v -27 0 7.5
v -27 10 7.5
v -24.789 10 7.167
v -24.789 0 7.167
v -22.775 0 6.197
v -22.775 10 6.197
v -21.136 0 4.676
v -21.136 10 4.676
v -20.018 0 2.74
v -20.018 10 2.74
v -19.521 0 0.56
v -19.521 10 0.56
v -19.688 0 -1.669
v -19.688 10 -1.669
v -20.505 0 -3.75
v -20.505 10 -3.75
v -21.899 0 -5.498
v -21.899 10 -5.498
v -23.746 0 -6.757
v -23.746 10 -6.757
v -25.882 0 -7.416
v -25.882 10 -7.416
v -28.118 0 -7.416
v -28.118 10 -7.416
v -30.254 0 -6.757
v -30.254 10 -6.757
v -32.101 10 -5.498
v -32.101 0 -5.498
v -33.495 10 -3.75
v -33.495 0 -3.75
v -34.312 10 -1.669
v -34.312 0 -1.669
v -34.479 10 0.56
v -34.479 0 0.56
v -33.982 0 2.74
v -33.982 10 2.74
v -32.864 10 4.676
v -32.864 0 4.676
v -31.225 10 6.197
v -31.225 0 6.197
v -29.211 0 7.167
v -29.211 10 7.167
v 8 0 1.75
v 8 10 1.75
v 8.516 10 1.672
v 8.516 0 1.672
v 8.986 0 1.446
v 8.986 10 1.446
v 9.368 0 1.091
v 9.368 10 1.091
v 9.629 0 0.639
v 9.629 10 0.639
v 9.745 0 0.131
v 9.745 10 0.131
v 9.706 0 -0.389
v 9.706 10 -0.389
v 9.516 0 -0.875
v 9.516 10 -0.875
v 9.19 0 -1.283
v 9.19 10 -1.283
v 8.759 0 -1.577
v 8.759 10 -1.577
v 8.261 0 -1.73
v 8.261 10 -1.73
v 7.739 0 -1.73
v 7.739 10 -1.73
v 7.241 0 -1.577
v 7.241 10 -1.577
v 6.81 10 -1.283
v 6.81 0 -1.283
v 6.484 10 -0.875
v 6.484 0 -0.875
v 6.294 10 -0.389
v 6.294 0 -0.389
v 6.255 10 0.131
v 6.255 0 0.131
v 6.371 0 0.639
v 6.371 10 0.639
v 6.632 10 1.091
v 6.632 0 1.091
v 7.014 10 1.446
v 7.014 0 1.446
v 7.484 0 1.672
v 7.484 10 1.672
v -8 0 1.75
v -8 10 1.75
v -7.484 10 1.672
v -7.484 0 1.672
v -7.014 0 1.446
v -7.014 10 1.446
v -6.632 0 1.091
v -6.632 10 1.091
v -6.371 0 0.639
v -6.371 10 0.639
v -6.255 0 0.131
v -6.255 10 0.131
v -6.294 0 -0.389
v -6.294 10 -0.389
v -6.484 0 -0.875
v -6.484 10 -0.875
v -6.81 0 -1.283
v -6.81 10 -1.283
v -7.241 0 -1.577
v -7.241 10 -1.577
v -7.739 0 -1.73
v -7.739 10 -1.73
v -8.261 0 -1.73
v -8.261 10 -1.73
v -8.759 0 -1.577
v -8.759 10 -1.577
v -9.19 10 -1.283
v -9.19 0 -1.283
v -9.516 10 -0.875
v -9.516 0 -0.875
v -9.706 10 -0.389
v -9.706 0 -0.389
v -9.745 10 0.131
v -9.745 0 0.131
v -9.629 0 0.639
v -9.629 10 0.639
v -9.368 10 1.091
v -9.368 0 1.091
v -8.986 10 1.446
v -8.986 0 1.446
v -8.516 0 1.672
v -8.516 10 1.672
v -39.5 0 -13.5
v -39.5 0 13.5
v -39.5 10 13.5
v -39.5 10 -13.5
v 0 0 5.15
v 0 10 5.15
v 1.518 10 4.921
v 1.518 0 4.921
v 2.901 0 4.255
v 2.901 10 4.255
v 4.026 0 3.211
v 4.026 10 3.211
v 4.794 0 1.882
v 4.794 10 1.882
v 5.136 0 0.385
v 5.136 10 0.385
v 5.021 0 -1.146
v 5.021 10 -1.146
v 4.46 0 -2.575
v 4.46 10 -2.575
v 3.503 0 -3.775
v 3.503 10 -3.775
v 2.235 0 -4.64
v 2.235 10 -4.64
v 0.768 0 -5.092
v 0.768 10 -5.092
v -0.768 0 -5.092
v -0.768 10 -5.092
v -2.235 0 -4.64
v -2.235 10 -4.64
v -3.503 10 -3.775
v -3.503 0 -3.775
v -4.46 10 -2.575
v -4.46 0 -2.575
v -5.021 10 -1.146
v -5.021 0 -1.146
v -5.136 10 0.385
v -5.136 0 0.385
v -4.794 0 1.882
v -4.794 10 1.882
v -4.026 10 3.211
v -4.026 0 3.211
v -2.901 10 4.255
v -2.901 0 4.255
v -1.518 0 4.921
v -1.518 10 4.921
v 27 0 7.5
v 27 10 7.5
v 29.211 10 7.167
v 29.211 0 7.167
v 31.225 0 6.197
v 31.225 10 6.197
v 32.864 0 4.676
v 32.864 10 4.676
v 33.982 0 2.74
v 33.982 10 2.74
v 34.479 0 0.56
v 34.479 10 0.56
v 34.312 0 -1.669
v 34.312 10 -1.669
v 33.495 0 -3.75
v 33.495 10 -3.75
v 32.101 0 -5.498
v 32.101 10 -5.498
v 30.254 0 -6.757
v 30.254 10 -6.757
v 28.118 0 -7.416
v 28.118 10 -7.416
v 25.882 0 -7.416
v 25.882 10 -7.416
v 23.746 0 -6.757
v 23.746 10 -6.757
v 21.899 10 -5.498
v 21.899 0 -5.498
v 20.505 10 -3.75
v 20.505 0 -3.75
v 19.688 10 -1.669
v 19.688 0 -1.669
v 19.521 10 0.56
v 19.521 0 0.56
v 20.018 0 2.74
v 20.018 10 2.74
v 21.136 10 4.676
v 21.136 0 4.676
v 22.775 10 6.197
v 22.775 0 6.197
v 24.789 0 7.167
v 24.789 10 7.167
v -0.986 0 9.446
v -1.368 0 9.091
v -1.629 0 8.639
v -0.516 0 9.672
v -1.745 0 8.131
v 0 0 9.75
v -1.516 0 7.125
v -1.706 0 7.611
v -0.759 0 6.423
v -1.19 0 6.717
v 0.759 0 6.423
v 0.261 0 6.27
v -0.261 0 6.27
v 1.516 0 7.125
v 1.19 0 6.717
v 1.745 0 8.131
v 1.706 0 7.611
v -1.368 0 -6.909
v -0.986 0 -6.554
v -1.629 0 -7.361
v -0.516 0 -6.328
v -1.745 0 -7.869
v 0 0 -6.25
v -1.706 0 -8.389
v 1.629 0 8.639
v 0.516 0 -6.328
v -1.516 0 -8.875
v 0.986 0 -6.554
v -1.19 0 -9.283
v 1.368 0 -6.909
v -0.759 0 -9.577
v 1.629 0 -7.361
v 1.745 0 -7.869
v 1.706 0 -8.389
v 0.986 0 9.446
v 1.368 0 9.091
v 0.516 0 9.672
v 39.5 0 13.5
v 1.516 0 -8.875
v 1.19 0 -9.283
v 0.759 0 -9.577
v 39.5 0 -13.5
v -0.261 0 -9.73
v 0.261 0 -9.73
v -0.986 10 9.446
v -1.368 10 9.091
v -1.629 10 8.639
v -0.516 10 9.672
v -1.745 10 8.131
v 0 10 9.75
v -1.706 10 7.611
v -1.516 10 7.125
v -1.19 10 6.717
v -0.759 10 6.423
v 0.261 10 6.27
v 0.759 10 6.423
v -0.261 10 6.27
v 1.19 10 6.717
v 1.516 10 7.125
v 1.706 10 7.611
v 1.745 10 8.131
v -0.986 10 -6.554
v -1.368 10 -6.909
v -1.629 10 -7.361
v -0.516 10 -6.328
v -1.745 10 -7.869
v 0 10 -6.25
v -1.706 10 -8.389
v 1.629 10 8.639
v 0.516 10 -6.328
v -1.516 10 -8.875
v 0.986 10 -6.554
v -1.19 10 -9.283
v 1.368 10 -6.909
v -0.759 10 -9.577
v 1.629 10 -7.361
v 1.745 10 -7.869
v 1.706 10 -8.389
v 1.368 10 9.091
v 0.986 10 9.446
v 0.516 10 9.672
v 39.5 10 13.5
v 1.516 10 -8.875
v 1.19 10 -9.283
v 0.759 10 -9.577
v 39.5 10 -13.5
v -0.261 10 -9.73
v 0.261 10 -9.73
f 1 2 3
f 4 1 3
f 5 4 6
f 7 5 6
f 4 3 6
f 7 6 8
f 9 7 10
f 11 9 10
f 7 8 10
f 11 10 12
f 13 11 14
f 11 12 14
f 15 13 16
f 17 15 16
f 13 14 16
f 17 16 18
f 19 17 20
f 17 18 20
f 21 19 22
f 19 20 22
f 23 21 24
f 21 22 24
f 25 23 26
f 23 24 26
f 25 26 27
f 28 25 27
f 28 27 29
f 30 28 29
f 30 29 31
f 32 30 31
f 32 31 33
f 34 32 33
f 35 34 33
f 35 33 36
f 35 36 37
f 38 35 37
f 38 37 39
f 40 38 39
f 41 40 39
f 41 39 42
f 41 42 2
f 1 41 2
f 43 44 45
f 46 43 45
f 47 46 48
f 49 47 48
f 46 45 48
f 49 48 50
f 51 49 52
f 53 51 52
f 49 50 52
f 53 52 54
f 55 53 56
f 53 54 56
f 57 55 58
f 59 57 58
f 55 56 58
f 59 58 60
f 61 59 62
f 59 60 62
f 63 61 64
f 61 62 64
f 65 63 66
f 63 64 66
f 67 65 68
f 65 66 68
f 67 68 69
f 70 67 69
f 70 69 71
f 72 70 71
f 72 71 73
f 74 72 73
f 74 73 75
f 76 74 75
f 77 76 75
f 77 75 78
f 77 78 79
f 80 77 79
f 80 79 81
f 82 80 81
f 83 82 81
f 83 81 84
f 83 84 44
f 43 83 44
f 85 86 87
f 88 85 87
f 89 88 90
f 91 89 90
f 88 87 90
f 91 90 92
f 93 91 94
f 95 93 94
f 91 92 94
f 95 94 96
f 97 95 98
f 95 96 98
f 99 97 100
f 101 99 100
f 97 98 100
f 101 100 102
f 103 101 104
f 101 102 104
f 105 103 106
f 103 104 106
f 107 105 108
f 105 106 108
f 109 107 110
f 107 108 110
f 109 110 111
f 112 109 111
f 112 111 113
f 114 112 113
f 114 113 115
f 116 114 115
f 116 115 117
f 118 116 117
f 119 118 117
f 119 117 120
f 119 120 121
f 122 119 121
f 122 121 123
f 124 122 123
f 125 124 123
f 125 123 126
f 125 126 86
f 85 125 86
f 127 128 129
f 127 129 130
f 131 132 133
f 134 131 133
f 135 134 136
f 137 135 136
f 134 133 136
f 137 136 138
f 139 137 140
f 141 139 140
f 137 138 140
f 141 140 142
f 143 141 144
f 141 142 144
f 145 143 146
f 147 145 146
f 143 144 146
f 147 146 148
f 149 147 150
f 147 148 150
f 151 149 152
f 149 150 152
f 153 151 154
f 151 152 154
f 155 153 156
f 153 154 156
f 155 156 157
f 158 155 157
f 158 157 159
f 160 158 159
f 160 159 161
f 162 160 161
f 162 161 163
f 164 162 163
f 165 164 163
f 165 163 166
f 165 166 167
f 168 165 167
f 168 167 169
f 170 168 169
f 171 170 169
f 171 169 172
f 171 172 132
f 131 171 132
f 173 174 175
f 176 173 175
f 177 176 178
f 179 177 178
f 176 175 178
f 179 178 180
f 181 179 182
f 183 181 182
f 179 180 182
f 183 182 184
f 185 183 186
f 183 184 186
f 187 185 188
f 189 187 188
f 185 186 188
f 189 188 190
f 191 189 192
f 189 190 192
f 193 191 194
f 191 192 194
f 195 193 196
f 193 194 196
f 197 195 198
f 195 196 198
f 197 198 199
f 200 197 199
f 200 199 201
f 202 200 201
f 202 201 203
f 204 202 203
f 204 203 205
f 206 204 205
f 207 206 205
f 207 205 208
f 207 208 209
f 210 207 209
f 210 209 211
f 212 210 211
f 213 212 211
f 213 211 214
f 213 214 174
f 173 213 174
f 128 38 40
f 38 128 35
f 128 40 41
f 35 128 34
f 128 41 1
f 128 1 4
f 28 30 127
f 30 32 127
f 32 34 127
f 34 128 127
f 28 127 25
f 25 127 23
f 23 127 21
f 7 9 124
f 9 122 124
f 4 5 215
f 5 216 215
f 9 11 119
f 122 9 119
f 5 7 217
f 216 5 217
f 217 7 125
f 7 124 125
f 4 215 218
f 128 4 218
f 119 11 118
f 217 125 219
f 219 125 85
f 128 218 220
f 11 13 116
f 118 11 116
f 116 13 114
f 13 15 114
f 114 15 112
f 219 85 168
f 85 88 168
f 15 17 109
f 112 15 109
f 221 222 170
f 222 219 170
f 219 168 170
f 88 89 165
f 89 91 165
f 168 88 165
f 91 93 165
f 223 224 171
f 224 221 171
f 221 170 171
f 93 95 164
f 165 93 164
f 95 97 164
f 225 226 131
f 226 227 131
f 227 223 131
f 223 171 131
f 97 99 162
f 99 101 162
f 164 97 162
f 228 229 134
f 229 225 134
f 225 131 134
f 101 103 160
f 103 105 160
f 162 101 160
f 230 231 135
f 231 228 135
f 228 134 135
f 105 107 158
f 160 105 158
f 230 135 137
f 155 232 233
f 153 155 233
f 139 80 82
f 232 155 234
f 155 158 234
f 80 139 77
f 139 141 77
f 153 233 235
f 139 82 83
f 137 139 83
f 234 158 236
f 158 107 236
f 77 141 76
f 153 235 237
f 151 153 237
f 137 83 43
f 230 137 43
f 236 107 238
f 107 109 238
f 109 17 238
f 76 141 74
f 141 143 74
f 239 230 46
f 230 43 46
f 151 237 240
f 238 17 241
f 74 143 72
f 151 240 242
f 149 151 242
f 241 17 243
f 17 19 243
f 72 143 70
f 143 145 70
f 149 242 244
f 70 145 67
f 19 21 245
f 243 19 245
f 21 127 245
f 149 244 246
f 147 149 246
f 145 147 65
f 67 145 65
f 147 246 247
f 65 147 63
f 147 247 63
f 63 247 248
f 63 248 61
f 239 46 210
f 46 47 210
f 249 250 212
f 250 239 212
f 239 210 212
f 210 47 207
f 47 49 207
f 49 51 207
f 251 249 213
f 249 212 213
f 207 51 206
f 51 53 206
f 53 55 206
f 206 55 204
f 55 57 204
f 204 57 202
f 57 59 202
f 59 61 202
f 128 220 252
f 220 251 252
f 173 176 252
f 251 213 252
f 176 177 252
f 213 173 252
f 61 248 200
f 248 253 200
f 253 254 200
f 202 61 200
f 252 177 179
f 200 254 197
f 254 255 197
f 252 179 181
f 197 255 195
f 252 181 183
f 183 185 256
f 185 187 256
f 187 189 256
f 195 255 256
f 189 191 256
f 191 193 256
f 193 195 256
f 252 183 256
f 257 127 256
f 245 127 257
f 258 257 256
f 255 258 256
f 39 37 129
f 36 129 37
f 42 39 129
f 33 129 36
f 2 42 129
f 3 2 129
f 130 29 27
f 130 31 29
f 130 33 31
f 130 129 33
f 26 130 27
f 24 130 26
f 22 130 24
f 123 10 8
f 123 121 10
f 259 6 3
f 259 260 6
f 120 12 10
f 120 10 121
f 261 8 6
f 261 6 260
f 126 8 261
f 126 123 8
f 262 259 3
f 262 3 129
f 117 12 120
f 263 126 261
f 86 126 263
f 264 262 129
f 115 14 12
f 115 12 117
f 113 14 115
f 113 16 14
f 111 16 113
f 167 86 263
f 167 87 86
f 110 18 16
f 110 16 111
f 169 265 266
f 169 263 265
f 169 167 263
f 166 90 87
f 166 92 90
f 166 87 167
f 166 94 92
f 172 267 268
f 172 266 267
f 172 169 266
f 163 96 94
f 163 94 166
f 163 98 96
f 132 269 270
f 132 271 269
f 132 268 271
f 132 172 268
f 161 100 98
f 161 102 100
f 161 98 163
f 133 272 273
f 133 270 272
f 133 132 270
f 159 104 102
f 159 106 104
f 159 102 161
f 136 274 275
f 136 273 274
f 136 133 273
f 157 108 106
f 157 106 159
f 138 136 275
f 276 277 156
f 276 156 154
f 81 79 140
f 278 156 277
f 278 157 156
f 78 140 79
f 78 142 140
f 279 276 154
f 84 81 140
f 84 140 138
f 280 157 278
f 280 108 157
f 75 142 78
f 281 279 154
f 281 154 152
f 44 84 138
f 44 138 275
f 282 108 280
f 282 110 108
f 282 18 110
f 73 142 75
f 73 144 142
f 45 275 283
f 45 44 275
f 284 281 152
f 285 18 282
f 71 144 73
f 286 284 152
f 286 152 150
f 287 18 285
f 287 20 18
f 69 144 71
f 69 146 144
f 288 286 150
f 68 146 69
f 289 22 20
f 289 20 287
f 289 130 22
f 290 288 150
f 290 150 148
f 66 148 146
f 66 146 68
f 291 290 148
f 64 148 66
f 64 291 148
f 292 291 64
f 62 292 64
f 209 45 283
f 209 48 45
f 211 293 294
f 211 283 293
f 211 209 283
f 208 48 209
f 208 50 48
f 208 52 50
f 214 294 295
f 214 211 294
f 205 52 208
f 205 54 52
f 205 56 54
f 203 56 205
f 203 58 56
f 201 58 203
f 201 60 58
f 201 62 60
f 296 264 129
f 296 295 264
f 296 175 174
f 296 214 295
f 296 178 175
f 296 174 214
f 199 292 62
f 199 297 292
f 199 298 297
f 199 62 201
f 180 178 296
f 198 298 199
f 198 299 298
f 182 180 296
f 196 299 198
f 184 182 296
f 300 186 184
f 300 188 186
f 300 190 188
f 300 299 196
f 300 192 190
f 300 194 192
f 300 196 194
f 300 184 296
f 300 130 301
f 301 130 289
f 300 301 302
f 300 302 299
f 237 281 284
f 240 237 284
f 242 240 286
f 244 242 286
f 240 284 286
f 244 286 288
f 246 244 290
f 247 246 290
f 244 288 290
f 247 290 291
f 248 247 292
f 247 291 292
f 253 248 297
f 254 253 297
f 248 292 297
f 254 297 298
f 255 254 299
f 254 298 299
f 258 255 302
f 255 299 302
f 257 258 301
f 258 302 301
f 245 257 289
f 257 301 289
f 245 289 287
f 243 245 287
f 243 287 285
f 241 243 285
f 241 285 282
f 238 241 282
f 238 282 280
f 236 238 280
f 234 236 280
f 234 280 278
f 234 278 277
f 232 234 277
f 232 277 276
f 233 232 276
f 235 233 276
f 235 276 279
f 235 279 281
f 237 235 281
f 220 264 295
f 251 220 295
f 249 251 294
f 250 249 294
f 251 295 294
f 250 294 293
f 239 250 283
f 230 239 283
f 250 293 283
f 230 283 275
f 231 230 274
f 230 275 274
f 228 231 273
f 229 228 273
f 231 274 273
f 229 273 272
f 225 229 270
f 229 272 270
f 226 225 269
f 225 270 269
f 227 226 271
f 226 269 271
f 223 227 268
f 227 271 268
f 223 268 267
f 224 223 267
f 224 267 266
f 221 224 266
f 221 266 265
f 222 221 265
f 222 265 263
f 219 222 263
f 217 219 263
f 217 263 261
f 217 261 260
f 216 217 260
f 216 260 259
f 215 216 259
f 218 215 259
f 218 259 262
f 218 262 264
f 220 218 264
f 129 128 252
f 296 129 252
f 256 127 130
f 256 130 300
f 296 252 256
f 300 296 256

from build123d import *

# Parameters (mm, degrees)
SKETCH_1_W          = 79
SKETCH_1_H          = 27
EXTRUDE_1_DEPTH     = 10
SKETCH_3_R          = 7.5
CUT_EXTRUDE_1_DEPTH = 43.924352063
SKETCH_4_R          = 5.15
CUT_EXTRUDE_2_DEPTH = 43.924352063
SKETCH_5_R          = 1.75
CUT_EXTRUDE_3_DEPTH = 43.924352063


with BuildPart() as part:
    # 草图1 → 凸台-拉伸1 (new body)
    with BuildSketch(Plane(origin=(0, 0, 0), x_dir=(1, 0, 0), z_dir=(0, 1, 0))):
        Rectangle(SKETCH_1_W, SKETCH_1_H)
    extrude(amount=EXTRUDE_1_DEPTH)

    # 草图3 → 切除-拉伸1 (cut, through all)
    with BuildSketch(Plane(origin=(0, 10, 0), x_dir=(1, 0, 0), z_dir=(0, 1, 0))):
        with Locations(Location((-27, 0, 0), (0, 0, 270))):
            Circle(SKETCH_3_R)
        with Locations(Location((27, 0, 0), (0, 0, 270))):
            Circle(SKETCH_3_R)
    extrude(amount=-CUT_EXTRUDE_1_DEPTH, mode=Mode.SUBTRACT)

    # 草图4 → 切除-拉伸2 (cut, through all)
    with BuildSketch(Plane(origin=(0, 10, 0), x_dir=(1, 0, 0), z_dir=(0, 1, 0))):
        with Locations(Location((0, 0, 0), (0, 0, 270))):
            Circle(SKETCH_4_R)
    extrude(amount=-CUT_EXTRUDE_2_DEPTH, mode=Mode.SUBTRACT)

    # 草图5 → 切除-拉伸3 (cut, through all)
    with BuildSketch(Plane(origin=(0, 10, 0), x_dir=(1, 0, 0), z_dir=(0, 1, 0))):
        with Locations(Location((8, 0, 0), (0, 0, 270))):
            Circle(SKETCH_5_R)
        with Locations(Location((0, -8, 0), (0, 0, 270))):
            Circle(SKETCH_5_R)
        with Locations(Location((-8, 0, 0), (0, 0, 270))):
            Circle(SKETCH_5_R)
        with Locations(Location((0, 8, 0), (0, 0, 270))):
            Circle(SKETCH_5_R)
    extrude(amount=-CUT_EXTRUDE_3_DEPTH, mode=Mode.SUBTRACT)


solid = part.part
